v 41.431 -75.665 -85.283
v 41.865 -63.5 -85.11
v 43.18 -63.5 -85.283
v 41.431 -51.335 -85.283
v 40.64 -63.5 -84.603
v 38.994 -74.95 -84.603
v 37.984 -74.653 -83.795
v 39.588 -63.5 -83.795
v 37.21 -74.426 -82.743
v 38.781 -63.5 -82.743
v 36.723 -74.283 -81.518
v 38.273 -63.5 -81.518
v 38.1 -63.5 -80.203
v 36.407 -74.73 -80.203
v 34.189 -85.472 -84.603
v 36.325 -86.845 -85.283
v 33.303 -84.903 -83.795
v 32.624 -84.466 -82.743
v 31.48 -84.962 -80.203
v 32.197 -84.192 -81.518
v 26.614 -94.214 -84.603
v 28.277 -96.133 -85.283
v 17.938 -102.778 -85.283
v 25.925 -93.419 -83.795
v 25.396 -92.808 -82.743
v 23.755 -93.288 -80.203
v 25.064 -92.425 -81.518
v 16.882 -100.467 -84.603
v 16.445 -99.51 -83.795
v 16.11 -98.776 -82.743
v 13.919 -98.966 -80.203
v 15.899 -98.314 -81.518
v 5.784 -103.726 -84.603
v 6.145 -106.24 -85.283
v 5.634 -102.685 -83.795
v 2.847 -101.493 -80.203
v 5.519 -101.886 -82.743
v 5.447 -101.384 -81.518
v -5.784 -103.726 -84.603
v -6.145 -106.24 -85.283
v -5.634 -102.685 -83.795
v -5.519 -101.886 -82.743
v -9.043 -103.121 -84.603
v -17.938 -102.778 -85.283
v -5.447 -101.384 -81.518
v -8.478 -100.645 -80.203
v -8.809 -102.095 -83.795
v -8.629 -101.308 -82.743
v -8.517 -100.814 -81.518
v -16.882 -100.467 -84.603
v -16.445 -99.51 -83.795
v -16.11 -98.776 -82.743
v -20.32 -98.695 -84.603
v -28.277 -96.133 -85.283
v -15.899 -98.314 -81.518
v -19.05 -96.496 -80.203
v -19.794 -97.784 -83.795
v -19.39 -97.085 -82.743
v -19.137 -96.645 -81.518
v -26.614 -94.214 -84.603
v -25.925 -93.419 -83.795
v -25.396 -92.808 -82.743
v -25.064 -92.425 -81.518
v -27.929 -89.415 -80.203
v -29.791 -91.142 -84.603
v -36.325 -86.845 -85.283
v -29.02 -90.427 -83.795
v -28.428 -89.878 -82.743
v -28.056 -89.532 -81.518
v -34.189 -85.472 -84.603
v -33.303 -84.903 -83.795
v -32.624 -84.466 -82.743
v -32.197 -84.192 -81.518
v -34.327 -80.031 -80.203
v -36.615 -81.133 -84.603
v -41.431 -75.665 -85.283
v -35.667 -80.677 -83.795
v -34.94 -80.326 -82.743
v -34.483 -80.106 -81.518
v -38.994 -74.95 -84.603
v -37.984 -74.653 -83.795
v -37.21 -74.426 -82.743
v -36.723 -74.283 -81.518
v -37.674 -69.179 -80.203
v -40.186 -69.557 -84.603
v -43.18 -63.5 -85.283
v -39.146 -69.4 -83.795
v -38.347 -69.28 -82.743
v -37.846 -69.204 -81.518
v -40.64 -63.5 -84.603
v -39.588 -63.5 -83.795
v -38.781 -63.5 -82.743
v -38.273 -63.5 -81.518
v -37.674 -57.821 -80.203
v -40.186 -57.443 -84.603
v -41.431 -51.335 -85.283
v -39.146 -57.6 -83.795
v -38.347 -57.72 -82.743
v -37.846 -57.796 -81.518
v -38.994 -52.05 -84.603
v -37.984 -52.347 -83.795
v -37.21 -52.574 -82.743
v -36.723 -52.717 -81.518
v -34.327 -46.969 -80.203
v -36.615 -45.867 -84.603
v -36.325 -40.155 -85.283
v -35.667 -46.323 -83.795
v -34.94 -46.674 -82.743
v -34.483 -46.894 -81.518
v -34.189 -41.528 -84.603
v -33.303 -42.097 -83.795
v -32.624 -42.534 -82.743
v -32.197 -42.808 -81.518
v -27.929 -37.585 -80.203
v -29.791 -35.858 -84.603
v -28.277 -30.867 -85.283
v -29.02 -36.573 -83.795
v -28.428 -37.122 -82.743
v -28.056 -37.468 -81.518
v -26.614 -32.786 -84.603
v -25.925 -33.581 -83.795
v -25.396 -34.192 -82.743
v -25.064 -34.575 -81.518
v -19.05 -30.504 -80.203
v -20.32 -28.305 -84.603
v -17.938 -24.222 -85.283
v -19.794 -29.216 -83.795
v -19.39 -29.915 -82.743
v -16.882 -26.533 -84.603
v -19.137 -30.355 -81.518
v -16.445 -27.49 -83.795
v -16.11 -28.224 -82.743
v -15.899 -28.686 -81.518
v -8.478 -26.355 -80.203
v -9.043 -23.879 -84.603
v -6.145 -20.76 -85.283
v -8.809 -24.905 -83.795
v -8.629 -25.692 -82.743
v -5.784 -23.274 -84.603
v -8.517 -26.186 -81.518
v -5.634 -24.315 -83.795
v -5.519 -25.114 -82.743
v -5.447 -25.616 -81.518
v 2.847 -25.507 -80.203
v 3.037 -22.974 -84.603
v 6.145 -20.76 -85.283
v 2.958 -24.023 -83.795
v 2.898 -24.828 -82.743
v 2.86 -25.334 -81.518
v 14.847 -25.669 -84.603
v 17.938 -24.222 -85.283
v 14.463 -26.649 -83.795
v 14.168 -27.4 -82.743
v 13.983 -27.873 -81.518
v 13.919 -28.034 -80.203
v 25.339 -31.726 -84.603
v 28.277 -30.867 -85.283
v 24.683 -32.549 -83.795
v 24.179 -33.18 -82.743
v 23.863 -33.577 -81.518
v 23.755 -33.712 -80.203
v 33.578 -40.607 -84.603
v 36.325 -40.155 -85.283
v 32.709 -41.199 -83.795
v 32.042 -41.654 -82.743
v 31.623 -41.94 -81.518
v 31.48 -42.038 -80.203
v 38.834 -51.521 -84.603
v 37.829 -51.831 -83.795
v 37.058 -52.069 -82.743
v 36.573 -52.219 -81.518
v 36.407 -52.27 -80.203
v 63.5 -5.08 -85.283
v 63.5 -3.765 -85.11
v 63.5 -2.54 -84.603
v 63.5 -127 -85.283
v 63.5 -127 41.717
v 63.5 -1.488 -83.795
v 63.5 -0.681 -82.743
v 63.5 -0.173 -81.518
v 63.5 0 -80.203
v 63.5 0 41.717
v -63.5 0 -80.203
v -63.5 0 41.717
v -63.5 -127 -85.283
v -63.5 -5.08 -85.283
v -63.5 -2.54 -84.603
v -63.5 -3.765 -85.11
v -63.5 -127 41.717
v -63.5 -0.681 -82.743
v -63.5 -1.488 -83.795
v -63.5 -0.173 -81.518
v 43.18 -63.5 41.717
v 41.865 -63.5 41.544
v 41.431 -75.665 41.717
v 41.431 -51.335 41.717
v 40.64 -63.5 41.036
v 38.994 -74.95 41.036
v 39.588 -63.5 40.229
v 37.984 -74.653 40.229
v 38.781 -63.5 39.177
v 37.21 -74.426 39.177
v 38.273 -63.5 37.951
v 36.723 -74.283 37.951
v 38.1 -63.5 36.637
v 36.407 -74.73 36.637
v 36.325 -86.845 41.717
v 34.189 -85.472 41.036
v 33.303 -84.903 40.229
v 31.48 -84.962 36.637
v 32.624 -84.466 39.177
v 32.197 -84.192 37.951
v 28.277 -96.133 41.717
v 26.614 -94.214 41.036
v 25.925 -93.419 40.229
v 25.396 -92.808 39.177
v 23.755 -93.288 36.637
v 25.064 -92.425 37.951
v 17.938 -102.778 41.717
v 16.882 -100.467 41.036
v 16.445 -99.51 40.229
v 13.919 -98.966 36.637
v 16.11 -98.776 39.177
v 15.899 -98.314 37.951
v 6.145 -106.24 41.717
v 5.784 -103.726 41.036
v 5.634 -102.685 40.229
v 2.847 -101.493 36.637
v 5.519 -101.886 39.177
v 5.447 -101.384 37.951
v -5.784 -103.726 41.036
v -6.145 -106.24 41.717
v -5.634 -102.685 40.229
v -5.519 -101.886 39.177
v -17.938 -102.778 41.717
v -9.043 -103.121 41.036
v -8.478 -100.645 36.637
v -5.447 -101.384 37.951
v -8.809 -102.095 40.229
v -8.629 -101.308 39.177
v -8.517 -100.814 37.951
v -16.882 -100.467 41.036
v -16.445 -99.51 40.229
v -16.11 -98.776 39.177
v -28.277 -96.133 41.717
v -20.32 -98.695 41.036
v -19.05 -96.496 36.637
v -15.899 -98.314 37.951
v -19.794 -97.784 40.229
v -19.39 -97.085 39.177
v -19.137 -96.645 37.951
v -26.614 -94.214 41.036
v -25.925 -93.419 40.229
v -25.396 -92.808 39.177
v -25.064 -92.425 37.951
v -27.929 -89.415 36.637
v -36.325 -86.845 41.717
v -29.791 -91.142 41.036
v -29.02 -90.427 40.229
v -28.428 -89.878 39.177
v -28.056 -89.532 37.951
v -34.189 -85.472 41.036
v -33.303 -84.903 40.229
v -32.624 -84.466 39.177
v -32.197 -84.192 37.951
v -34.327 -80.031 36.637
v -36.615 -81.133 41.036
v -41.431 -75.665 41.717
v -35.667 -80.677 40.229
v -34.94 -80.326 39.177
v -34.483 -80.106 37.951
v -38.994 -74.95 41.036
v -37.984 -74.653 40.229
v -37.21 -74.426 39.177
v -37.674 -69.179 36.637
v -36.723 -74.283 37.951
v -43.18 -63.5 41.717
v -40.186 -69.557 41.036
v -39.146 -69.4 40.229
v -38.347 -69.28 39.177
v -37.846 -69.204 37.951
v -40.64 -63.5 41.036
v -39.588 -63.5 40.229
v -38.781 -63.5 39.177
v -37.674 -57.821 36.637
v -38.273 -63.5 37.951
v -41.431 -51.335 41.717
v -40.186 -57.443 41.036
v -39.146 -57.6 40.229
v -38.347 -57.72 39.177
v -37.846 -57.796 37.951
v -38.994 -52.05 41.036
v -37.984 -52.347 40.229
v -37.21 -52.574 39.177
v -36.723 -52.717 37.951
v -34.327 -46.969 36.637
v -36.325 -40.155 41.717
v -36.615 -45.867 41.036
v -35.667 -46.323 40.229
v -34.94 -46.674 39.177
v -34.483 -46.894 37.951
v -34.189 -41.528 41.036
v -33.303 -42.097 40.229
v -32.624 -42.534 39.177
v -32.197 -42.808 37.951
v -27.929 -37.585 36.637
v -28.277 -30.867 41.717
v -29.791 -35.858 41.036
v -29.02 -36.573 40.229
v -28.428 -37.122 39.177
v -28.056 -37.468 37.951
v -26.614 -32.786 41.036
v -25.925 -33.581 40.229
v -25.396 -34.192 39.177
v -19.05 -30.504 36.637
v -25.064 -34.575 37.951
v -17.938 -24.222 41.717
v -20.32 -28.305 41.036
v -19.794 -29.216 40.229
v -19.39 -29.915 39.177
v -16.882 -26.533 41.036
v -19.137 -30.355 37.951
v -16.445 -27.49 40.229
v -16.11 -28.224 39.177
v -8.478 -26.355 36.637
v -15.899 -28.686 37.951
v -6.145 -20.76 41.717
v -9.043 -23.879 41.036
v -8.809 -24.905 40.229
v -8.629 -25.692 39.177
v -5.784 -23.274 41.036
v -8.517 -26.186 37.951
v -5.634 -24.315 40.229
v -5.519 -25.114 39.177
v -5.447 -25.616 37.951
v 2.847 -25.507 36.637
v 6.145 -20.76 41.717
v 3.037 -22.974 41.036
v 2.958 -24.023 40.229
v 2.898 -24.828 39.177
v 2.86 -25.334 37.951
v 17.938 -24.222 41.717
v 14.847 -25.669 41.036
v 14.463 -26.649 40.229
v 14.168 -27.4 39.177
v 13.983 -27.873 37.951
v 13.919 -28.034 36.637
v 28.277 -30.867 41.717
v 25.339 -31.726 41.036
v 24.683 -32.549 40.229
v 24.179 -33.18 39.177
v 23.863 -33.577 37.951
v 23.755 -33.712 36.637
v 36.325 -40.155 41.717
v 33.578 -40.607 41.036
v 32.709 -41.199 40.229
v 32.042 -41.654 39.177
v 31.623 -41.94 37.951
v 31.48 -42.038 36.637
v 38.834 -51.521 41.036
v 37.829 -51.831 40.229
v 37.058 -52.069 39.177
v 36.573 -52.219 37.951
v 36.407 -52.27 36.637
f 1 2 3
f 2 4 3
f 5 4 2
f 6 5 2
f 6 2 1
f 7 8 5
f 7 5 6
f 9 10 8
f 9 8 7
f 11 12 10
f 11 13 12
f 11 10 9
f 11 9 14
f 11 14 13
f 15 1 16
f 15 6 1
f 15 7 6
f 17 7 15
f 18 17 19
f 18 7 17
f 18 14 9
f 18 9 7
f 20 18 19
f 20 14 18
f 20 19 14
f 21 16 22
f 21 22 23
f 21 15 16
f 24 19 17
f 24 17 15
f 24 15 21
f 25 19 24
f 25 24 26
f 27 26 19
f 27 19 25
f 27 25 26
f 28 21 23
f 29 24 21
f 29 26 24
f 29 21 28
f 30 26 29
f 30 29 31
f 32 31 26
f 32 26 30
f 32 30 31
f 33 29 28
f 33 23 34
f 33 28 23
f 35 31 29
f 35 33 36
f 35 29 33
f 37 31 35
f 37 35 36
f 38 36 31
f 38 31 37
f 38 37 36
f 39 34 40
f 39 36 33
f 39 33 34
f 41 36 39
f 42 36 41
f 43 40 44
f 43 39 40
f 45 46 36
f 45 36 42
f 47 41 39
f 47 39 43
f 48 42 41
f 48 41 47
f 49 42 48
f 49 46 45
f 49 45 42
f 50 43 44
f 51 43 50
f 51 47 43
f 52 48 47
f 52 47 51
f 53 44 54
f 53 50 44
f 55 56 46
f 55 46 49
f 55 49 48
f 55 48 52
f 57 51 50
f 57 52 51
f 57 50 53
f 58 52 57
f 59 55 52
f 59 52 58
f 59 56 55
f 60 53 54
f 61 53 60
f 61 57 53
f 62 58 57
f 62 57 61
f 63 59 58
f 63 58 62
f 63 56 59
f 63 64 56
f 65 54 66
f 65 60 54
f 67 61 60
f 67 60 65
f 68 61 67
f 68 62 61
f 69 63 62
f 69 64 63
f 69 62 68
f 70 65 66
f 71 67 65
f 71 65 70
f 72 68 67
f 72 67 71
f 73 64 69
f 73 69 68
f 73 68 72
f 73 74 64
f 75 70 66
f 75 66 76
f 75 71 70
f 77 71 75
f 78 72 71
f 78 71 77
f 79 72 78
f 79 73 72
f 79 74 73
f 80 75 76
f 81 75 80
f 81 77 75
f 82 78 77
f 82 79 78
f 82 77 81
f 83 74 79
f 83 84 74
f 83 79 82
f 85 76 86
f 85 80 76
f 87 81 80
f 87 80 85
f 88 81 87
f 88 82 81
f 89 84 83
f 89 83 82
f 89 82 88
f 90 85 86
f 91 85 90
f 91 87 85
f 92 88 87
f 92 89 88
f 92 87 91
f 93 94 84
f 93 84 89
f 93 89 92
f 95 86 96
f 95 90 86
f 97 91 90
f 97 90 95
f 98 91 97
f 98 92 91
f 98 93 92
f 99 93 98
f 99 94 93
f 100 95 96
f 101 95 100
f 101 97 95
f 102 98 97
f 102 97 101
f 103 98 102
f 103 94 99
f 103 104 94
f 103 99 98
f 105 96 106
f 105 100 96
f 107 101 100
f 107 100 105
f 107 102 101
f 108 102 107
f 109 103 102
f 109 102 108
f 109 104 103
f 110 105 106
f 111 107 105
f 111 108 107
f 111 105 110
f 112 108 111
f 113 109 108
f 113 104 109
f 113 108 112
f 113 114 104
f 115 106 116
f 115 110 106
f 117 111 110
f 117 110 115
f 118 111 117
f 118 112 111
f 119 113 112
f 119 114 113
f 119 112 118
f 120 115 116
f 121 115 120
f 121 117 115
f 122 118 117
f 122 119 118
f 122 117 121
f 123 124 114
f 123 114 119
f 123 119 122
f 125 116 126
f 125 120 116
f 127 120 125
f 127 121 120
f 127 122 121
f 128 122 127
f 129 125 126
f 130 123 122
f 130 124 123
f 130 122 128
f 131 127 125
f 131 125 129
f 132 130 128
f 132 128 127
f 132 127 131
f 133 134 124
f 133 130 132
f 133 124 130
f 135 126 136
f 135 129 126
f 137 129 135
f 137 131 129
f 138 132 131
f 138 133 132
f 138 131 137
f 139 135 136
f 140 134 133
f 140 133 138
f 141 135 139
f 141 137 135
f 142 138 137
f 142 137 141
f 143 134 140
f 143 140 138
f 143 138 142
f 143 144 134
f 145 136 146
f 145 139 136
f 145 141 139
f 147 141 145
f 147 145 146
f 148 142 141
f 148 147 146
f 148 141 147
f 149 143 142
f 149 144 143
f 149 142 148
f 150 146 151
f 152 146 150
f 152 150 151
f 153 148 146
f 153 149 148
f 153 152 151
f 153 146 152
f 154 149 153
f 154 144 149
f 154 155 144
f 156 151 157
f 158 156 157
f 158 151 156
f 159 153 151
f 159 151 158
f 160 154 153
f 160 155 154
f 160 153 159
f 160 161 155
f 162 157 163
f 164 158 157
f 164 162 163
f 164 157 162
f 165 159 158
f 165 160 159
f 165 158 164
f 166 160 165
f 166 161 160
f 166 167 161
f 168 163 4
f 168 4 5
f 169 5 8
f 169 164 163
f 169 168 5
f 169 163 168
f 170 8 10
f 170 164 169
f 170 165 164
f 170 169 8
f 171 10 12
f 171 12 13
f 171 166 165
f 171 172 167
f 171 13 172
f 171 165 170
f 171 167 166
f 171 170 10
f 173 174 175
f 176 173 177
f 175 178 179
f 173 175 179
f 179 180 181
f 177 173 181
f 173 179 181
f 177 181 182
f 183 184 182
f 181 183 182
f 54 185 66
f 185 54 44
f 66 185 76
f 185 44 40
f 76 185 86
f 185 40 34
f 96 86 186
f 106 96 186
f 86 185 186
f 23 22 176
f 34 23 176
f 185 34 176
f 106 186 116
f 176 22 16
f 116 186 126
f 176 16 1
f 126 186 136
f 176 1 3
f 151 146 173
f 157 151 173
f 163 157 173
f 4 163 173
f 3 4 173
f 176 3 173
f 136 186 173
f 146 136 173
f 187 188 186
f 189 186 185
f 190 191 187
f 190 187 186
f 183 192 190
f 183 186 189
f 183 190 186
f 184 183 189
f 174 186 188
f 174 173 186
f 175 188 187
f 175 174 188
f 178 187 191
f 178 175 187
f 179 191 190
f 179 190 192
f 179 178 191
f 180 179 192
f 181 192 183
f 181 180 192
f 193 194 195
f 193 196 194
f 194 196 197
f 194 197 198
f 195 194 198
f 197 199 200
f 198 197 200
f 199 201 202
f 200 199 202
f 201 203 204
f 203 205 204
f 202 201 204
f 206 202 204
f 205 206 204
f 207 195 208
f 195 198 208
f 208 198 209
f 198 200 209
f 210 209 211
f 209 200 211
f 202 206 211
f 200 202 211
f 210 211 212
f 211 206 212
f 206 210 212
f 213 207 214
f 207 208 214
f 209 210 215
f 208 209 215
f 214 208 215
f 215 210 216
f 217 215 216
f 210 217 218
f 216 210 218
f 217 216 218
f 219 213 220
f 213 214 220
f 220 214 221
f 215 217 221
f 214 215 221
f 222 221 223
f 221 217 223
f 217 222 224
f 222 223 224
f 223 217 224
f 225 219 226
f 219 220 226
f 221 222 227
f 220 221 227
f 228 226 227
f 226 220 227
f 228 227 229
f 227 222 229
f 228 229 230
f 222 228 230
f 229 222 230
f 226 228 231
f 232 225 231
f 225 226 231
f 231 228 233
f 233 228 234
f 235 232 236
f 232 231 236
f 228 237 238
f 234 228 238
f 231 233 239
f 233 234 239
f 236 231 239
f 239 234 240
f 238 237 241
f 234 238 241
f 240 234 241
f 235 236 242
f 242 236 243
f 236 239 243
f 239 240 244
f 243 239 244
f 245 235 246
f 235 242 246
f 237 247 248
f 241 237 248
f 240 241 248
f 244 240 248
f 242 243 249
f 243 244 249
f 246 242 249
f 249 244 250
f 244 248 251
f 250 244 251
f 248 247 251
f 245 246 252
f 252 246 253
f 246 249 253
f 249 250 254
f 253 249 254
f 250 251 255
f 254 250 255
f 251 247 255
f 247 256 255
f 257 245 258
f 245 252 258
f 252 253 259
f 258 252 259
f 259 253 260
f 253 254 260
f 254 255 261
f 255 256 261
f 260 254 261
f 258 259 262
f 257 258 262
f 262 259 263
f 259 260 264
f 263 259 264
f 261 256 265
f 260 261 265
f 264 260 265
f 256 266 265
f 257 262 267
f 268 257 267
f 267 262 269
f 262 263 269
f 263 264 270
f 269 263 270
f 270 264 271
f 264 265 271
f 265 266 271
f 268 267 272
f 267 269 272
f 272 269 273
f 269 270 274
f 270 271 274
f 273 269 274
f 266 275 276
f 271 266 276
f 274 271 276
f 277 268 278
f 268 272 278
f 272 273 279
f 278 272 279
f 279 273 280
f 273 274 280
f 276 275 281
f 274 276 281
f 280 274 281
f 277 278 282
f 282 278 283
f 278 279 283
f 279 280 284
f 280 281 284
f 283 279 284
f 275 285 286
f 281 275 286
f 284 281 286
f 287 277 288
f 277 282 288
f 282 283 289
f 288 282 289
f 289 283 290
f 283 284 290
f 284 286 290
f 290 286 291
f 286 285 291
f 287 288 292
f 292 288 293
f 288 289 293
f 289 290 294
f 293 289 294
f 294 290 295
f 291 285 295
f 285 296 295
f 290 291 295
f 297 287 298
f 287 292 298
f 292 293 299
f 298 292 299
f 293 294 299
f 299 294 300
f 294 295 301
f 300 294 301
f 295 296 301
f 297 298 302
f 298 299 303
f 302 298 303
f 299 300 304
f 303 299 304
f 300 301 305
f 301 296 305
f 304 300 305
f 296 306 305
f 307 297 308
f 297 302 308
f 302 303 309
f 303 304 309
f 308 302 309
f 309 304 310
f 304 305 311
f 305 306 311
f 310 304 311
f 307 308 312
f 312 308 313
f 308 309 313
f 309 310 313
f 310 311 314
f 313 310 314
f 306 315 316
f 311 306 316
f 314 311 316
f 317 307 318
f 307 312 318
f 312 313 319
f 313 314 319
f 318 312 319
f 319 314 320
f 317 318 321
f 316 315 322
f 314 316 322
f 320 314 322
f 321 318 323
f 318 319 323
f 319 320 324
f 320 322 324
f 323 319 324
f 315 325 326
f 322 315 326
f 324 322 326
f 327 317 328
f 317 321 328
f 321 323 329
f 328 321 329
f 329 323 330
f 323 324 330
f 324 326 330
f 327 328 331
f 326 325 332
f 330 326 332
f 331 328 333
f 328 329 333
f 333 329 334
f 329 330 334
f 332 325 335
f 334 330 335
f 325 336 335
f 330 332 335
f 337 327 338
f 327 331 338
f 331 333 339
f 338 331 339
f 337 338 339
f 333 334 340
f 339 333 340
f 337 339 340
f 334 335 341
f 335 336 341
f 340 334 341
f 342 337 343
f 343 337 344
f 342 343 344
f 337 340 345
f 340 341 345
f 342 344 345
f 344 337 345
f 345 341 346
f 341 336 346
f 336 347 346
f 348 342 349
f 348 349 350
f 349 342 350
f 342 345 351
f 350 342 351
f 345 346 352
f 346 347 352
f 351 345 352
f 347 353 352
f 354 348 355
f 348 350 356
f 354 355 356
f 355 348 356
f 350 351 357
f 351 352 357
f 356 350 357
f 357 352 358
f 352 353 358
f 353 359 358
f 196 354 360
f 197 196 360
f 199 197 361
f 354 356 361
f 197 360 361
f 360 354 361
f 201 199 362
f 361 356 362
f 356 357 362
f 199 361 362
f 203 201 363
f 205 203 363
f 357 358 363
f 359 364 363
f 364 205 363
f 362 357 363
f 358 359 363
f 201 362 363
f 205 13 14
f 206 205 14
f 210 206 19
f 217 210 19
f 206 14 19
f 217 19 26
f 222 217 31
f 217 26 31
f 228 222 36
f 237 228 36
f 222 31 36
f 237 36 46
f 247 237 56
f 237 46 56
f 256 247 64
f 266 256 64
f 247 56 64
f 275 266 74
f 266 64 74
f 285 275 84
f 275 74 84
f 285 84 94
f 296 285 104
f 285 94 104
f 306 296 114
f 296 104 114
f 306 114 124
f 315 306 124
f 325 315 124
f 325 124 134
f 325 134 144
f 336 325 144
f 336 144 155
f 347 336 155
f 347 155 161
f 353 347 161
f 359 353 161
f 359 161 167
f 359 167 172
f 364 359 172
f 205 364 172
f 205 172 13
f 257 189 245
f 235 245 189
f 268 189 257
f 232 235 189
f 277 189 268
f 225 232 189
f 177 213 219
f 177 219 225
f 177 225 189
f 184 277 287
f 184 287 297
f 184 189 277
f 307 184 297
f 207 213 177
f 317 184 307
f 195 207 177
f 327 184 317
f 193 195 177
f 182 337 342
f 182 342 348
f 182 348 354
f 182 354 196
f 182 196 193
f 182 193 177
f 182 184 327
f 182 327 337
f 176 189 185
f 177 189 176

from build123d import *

# Parameters (mm, degrees)
F0_W     = 127
F0_H     = 127
F1_DEPTH = 127
F2_R     = 38.1
F3_DEPTH = 127.001
F4_R     = 5.08


with BuildPart() as f1:
    # F0 (on Front) → F1 (new body)
    with BuildSketch(Plane.XZ):
        with Locations((-2e-06, -21.783345)):
            Rectangle(F0_W, F0_H)
    extrude(amount=F1_DEPTH)

    # F2 (on face) → F3 (cut, through all)
    with BuildSketch(Plane(origin=(0, 0, -85.283345), x_dir=(1, 0, 0), z_dir=(0, 0, -1))):
        with Locations((-2e-06, 63.5)):
            Circle(F2_R)
    extrude(amount=-F3_DEPTH, mode=Mode.SUBTRACT)

    # F4
    f4_edges = [f1.edges().sort_by_distance(p)[0] for p in [
        (-38.100002, -63.5, -85.283345),
        (38.099998, -63.5, -21.783345),
        (-38.100002, -63.5, 41.716655),
        (-2e-06, 0, -85.283345),
    ]]
    fillet(f4_edges, radius=F4_R)


solid = f1.part
